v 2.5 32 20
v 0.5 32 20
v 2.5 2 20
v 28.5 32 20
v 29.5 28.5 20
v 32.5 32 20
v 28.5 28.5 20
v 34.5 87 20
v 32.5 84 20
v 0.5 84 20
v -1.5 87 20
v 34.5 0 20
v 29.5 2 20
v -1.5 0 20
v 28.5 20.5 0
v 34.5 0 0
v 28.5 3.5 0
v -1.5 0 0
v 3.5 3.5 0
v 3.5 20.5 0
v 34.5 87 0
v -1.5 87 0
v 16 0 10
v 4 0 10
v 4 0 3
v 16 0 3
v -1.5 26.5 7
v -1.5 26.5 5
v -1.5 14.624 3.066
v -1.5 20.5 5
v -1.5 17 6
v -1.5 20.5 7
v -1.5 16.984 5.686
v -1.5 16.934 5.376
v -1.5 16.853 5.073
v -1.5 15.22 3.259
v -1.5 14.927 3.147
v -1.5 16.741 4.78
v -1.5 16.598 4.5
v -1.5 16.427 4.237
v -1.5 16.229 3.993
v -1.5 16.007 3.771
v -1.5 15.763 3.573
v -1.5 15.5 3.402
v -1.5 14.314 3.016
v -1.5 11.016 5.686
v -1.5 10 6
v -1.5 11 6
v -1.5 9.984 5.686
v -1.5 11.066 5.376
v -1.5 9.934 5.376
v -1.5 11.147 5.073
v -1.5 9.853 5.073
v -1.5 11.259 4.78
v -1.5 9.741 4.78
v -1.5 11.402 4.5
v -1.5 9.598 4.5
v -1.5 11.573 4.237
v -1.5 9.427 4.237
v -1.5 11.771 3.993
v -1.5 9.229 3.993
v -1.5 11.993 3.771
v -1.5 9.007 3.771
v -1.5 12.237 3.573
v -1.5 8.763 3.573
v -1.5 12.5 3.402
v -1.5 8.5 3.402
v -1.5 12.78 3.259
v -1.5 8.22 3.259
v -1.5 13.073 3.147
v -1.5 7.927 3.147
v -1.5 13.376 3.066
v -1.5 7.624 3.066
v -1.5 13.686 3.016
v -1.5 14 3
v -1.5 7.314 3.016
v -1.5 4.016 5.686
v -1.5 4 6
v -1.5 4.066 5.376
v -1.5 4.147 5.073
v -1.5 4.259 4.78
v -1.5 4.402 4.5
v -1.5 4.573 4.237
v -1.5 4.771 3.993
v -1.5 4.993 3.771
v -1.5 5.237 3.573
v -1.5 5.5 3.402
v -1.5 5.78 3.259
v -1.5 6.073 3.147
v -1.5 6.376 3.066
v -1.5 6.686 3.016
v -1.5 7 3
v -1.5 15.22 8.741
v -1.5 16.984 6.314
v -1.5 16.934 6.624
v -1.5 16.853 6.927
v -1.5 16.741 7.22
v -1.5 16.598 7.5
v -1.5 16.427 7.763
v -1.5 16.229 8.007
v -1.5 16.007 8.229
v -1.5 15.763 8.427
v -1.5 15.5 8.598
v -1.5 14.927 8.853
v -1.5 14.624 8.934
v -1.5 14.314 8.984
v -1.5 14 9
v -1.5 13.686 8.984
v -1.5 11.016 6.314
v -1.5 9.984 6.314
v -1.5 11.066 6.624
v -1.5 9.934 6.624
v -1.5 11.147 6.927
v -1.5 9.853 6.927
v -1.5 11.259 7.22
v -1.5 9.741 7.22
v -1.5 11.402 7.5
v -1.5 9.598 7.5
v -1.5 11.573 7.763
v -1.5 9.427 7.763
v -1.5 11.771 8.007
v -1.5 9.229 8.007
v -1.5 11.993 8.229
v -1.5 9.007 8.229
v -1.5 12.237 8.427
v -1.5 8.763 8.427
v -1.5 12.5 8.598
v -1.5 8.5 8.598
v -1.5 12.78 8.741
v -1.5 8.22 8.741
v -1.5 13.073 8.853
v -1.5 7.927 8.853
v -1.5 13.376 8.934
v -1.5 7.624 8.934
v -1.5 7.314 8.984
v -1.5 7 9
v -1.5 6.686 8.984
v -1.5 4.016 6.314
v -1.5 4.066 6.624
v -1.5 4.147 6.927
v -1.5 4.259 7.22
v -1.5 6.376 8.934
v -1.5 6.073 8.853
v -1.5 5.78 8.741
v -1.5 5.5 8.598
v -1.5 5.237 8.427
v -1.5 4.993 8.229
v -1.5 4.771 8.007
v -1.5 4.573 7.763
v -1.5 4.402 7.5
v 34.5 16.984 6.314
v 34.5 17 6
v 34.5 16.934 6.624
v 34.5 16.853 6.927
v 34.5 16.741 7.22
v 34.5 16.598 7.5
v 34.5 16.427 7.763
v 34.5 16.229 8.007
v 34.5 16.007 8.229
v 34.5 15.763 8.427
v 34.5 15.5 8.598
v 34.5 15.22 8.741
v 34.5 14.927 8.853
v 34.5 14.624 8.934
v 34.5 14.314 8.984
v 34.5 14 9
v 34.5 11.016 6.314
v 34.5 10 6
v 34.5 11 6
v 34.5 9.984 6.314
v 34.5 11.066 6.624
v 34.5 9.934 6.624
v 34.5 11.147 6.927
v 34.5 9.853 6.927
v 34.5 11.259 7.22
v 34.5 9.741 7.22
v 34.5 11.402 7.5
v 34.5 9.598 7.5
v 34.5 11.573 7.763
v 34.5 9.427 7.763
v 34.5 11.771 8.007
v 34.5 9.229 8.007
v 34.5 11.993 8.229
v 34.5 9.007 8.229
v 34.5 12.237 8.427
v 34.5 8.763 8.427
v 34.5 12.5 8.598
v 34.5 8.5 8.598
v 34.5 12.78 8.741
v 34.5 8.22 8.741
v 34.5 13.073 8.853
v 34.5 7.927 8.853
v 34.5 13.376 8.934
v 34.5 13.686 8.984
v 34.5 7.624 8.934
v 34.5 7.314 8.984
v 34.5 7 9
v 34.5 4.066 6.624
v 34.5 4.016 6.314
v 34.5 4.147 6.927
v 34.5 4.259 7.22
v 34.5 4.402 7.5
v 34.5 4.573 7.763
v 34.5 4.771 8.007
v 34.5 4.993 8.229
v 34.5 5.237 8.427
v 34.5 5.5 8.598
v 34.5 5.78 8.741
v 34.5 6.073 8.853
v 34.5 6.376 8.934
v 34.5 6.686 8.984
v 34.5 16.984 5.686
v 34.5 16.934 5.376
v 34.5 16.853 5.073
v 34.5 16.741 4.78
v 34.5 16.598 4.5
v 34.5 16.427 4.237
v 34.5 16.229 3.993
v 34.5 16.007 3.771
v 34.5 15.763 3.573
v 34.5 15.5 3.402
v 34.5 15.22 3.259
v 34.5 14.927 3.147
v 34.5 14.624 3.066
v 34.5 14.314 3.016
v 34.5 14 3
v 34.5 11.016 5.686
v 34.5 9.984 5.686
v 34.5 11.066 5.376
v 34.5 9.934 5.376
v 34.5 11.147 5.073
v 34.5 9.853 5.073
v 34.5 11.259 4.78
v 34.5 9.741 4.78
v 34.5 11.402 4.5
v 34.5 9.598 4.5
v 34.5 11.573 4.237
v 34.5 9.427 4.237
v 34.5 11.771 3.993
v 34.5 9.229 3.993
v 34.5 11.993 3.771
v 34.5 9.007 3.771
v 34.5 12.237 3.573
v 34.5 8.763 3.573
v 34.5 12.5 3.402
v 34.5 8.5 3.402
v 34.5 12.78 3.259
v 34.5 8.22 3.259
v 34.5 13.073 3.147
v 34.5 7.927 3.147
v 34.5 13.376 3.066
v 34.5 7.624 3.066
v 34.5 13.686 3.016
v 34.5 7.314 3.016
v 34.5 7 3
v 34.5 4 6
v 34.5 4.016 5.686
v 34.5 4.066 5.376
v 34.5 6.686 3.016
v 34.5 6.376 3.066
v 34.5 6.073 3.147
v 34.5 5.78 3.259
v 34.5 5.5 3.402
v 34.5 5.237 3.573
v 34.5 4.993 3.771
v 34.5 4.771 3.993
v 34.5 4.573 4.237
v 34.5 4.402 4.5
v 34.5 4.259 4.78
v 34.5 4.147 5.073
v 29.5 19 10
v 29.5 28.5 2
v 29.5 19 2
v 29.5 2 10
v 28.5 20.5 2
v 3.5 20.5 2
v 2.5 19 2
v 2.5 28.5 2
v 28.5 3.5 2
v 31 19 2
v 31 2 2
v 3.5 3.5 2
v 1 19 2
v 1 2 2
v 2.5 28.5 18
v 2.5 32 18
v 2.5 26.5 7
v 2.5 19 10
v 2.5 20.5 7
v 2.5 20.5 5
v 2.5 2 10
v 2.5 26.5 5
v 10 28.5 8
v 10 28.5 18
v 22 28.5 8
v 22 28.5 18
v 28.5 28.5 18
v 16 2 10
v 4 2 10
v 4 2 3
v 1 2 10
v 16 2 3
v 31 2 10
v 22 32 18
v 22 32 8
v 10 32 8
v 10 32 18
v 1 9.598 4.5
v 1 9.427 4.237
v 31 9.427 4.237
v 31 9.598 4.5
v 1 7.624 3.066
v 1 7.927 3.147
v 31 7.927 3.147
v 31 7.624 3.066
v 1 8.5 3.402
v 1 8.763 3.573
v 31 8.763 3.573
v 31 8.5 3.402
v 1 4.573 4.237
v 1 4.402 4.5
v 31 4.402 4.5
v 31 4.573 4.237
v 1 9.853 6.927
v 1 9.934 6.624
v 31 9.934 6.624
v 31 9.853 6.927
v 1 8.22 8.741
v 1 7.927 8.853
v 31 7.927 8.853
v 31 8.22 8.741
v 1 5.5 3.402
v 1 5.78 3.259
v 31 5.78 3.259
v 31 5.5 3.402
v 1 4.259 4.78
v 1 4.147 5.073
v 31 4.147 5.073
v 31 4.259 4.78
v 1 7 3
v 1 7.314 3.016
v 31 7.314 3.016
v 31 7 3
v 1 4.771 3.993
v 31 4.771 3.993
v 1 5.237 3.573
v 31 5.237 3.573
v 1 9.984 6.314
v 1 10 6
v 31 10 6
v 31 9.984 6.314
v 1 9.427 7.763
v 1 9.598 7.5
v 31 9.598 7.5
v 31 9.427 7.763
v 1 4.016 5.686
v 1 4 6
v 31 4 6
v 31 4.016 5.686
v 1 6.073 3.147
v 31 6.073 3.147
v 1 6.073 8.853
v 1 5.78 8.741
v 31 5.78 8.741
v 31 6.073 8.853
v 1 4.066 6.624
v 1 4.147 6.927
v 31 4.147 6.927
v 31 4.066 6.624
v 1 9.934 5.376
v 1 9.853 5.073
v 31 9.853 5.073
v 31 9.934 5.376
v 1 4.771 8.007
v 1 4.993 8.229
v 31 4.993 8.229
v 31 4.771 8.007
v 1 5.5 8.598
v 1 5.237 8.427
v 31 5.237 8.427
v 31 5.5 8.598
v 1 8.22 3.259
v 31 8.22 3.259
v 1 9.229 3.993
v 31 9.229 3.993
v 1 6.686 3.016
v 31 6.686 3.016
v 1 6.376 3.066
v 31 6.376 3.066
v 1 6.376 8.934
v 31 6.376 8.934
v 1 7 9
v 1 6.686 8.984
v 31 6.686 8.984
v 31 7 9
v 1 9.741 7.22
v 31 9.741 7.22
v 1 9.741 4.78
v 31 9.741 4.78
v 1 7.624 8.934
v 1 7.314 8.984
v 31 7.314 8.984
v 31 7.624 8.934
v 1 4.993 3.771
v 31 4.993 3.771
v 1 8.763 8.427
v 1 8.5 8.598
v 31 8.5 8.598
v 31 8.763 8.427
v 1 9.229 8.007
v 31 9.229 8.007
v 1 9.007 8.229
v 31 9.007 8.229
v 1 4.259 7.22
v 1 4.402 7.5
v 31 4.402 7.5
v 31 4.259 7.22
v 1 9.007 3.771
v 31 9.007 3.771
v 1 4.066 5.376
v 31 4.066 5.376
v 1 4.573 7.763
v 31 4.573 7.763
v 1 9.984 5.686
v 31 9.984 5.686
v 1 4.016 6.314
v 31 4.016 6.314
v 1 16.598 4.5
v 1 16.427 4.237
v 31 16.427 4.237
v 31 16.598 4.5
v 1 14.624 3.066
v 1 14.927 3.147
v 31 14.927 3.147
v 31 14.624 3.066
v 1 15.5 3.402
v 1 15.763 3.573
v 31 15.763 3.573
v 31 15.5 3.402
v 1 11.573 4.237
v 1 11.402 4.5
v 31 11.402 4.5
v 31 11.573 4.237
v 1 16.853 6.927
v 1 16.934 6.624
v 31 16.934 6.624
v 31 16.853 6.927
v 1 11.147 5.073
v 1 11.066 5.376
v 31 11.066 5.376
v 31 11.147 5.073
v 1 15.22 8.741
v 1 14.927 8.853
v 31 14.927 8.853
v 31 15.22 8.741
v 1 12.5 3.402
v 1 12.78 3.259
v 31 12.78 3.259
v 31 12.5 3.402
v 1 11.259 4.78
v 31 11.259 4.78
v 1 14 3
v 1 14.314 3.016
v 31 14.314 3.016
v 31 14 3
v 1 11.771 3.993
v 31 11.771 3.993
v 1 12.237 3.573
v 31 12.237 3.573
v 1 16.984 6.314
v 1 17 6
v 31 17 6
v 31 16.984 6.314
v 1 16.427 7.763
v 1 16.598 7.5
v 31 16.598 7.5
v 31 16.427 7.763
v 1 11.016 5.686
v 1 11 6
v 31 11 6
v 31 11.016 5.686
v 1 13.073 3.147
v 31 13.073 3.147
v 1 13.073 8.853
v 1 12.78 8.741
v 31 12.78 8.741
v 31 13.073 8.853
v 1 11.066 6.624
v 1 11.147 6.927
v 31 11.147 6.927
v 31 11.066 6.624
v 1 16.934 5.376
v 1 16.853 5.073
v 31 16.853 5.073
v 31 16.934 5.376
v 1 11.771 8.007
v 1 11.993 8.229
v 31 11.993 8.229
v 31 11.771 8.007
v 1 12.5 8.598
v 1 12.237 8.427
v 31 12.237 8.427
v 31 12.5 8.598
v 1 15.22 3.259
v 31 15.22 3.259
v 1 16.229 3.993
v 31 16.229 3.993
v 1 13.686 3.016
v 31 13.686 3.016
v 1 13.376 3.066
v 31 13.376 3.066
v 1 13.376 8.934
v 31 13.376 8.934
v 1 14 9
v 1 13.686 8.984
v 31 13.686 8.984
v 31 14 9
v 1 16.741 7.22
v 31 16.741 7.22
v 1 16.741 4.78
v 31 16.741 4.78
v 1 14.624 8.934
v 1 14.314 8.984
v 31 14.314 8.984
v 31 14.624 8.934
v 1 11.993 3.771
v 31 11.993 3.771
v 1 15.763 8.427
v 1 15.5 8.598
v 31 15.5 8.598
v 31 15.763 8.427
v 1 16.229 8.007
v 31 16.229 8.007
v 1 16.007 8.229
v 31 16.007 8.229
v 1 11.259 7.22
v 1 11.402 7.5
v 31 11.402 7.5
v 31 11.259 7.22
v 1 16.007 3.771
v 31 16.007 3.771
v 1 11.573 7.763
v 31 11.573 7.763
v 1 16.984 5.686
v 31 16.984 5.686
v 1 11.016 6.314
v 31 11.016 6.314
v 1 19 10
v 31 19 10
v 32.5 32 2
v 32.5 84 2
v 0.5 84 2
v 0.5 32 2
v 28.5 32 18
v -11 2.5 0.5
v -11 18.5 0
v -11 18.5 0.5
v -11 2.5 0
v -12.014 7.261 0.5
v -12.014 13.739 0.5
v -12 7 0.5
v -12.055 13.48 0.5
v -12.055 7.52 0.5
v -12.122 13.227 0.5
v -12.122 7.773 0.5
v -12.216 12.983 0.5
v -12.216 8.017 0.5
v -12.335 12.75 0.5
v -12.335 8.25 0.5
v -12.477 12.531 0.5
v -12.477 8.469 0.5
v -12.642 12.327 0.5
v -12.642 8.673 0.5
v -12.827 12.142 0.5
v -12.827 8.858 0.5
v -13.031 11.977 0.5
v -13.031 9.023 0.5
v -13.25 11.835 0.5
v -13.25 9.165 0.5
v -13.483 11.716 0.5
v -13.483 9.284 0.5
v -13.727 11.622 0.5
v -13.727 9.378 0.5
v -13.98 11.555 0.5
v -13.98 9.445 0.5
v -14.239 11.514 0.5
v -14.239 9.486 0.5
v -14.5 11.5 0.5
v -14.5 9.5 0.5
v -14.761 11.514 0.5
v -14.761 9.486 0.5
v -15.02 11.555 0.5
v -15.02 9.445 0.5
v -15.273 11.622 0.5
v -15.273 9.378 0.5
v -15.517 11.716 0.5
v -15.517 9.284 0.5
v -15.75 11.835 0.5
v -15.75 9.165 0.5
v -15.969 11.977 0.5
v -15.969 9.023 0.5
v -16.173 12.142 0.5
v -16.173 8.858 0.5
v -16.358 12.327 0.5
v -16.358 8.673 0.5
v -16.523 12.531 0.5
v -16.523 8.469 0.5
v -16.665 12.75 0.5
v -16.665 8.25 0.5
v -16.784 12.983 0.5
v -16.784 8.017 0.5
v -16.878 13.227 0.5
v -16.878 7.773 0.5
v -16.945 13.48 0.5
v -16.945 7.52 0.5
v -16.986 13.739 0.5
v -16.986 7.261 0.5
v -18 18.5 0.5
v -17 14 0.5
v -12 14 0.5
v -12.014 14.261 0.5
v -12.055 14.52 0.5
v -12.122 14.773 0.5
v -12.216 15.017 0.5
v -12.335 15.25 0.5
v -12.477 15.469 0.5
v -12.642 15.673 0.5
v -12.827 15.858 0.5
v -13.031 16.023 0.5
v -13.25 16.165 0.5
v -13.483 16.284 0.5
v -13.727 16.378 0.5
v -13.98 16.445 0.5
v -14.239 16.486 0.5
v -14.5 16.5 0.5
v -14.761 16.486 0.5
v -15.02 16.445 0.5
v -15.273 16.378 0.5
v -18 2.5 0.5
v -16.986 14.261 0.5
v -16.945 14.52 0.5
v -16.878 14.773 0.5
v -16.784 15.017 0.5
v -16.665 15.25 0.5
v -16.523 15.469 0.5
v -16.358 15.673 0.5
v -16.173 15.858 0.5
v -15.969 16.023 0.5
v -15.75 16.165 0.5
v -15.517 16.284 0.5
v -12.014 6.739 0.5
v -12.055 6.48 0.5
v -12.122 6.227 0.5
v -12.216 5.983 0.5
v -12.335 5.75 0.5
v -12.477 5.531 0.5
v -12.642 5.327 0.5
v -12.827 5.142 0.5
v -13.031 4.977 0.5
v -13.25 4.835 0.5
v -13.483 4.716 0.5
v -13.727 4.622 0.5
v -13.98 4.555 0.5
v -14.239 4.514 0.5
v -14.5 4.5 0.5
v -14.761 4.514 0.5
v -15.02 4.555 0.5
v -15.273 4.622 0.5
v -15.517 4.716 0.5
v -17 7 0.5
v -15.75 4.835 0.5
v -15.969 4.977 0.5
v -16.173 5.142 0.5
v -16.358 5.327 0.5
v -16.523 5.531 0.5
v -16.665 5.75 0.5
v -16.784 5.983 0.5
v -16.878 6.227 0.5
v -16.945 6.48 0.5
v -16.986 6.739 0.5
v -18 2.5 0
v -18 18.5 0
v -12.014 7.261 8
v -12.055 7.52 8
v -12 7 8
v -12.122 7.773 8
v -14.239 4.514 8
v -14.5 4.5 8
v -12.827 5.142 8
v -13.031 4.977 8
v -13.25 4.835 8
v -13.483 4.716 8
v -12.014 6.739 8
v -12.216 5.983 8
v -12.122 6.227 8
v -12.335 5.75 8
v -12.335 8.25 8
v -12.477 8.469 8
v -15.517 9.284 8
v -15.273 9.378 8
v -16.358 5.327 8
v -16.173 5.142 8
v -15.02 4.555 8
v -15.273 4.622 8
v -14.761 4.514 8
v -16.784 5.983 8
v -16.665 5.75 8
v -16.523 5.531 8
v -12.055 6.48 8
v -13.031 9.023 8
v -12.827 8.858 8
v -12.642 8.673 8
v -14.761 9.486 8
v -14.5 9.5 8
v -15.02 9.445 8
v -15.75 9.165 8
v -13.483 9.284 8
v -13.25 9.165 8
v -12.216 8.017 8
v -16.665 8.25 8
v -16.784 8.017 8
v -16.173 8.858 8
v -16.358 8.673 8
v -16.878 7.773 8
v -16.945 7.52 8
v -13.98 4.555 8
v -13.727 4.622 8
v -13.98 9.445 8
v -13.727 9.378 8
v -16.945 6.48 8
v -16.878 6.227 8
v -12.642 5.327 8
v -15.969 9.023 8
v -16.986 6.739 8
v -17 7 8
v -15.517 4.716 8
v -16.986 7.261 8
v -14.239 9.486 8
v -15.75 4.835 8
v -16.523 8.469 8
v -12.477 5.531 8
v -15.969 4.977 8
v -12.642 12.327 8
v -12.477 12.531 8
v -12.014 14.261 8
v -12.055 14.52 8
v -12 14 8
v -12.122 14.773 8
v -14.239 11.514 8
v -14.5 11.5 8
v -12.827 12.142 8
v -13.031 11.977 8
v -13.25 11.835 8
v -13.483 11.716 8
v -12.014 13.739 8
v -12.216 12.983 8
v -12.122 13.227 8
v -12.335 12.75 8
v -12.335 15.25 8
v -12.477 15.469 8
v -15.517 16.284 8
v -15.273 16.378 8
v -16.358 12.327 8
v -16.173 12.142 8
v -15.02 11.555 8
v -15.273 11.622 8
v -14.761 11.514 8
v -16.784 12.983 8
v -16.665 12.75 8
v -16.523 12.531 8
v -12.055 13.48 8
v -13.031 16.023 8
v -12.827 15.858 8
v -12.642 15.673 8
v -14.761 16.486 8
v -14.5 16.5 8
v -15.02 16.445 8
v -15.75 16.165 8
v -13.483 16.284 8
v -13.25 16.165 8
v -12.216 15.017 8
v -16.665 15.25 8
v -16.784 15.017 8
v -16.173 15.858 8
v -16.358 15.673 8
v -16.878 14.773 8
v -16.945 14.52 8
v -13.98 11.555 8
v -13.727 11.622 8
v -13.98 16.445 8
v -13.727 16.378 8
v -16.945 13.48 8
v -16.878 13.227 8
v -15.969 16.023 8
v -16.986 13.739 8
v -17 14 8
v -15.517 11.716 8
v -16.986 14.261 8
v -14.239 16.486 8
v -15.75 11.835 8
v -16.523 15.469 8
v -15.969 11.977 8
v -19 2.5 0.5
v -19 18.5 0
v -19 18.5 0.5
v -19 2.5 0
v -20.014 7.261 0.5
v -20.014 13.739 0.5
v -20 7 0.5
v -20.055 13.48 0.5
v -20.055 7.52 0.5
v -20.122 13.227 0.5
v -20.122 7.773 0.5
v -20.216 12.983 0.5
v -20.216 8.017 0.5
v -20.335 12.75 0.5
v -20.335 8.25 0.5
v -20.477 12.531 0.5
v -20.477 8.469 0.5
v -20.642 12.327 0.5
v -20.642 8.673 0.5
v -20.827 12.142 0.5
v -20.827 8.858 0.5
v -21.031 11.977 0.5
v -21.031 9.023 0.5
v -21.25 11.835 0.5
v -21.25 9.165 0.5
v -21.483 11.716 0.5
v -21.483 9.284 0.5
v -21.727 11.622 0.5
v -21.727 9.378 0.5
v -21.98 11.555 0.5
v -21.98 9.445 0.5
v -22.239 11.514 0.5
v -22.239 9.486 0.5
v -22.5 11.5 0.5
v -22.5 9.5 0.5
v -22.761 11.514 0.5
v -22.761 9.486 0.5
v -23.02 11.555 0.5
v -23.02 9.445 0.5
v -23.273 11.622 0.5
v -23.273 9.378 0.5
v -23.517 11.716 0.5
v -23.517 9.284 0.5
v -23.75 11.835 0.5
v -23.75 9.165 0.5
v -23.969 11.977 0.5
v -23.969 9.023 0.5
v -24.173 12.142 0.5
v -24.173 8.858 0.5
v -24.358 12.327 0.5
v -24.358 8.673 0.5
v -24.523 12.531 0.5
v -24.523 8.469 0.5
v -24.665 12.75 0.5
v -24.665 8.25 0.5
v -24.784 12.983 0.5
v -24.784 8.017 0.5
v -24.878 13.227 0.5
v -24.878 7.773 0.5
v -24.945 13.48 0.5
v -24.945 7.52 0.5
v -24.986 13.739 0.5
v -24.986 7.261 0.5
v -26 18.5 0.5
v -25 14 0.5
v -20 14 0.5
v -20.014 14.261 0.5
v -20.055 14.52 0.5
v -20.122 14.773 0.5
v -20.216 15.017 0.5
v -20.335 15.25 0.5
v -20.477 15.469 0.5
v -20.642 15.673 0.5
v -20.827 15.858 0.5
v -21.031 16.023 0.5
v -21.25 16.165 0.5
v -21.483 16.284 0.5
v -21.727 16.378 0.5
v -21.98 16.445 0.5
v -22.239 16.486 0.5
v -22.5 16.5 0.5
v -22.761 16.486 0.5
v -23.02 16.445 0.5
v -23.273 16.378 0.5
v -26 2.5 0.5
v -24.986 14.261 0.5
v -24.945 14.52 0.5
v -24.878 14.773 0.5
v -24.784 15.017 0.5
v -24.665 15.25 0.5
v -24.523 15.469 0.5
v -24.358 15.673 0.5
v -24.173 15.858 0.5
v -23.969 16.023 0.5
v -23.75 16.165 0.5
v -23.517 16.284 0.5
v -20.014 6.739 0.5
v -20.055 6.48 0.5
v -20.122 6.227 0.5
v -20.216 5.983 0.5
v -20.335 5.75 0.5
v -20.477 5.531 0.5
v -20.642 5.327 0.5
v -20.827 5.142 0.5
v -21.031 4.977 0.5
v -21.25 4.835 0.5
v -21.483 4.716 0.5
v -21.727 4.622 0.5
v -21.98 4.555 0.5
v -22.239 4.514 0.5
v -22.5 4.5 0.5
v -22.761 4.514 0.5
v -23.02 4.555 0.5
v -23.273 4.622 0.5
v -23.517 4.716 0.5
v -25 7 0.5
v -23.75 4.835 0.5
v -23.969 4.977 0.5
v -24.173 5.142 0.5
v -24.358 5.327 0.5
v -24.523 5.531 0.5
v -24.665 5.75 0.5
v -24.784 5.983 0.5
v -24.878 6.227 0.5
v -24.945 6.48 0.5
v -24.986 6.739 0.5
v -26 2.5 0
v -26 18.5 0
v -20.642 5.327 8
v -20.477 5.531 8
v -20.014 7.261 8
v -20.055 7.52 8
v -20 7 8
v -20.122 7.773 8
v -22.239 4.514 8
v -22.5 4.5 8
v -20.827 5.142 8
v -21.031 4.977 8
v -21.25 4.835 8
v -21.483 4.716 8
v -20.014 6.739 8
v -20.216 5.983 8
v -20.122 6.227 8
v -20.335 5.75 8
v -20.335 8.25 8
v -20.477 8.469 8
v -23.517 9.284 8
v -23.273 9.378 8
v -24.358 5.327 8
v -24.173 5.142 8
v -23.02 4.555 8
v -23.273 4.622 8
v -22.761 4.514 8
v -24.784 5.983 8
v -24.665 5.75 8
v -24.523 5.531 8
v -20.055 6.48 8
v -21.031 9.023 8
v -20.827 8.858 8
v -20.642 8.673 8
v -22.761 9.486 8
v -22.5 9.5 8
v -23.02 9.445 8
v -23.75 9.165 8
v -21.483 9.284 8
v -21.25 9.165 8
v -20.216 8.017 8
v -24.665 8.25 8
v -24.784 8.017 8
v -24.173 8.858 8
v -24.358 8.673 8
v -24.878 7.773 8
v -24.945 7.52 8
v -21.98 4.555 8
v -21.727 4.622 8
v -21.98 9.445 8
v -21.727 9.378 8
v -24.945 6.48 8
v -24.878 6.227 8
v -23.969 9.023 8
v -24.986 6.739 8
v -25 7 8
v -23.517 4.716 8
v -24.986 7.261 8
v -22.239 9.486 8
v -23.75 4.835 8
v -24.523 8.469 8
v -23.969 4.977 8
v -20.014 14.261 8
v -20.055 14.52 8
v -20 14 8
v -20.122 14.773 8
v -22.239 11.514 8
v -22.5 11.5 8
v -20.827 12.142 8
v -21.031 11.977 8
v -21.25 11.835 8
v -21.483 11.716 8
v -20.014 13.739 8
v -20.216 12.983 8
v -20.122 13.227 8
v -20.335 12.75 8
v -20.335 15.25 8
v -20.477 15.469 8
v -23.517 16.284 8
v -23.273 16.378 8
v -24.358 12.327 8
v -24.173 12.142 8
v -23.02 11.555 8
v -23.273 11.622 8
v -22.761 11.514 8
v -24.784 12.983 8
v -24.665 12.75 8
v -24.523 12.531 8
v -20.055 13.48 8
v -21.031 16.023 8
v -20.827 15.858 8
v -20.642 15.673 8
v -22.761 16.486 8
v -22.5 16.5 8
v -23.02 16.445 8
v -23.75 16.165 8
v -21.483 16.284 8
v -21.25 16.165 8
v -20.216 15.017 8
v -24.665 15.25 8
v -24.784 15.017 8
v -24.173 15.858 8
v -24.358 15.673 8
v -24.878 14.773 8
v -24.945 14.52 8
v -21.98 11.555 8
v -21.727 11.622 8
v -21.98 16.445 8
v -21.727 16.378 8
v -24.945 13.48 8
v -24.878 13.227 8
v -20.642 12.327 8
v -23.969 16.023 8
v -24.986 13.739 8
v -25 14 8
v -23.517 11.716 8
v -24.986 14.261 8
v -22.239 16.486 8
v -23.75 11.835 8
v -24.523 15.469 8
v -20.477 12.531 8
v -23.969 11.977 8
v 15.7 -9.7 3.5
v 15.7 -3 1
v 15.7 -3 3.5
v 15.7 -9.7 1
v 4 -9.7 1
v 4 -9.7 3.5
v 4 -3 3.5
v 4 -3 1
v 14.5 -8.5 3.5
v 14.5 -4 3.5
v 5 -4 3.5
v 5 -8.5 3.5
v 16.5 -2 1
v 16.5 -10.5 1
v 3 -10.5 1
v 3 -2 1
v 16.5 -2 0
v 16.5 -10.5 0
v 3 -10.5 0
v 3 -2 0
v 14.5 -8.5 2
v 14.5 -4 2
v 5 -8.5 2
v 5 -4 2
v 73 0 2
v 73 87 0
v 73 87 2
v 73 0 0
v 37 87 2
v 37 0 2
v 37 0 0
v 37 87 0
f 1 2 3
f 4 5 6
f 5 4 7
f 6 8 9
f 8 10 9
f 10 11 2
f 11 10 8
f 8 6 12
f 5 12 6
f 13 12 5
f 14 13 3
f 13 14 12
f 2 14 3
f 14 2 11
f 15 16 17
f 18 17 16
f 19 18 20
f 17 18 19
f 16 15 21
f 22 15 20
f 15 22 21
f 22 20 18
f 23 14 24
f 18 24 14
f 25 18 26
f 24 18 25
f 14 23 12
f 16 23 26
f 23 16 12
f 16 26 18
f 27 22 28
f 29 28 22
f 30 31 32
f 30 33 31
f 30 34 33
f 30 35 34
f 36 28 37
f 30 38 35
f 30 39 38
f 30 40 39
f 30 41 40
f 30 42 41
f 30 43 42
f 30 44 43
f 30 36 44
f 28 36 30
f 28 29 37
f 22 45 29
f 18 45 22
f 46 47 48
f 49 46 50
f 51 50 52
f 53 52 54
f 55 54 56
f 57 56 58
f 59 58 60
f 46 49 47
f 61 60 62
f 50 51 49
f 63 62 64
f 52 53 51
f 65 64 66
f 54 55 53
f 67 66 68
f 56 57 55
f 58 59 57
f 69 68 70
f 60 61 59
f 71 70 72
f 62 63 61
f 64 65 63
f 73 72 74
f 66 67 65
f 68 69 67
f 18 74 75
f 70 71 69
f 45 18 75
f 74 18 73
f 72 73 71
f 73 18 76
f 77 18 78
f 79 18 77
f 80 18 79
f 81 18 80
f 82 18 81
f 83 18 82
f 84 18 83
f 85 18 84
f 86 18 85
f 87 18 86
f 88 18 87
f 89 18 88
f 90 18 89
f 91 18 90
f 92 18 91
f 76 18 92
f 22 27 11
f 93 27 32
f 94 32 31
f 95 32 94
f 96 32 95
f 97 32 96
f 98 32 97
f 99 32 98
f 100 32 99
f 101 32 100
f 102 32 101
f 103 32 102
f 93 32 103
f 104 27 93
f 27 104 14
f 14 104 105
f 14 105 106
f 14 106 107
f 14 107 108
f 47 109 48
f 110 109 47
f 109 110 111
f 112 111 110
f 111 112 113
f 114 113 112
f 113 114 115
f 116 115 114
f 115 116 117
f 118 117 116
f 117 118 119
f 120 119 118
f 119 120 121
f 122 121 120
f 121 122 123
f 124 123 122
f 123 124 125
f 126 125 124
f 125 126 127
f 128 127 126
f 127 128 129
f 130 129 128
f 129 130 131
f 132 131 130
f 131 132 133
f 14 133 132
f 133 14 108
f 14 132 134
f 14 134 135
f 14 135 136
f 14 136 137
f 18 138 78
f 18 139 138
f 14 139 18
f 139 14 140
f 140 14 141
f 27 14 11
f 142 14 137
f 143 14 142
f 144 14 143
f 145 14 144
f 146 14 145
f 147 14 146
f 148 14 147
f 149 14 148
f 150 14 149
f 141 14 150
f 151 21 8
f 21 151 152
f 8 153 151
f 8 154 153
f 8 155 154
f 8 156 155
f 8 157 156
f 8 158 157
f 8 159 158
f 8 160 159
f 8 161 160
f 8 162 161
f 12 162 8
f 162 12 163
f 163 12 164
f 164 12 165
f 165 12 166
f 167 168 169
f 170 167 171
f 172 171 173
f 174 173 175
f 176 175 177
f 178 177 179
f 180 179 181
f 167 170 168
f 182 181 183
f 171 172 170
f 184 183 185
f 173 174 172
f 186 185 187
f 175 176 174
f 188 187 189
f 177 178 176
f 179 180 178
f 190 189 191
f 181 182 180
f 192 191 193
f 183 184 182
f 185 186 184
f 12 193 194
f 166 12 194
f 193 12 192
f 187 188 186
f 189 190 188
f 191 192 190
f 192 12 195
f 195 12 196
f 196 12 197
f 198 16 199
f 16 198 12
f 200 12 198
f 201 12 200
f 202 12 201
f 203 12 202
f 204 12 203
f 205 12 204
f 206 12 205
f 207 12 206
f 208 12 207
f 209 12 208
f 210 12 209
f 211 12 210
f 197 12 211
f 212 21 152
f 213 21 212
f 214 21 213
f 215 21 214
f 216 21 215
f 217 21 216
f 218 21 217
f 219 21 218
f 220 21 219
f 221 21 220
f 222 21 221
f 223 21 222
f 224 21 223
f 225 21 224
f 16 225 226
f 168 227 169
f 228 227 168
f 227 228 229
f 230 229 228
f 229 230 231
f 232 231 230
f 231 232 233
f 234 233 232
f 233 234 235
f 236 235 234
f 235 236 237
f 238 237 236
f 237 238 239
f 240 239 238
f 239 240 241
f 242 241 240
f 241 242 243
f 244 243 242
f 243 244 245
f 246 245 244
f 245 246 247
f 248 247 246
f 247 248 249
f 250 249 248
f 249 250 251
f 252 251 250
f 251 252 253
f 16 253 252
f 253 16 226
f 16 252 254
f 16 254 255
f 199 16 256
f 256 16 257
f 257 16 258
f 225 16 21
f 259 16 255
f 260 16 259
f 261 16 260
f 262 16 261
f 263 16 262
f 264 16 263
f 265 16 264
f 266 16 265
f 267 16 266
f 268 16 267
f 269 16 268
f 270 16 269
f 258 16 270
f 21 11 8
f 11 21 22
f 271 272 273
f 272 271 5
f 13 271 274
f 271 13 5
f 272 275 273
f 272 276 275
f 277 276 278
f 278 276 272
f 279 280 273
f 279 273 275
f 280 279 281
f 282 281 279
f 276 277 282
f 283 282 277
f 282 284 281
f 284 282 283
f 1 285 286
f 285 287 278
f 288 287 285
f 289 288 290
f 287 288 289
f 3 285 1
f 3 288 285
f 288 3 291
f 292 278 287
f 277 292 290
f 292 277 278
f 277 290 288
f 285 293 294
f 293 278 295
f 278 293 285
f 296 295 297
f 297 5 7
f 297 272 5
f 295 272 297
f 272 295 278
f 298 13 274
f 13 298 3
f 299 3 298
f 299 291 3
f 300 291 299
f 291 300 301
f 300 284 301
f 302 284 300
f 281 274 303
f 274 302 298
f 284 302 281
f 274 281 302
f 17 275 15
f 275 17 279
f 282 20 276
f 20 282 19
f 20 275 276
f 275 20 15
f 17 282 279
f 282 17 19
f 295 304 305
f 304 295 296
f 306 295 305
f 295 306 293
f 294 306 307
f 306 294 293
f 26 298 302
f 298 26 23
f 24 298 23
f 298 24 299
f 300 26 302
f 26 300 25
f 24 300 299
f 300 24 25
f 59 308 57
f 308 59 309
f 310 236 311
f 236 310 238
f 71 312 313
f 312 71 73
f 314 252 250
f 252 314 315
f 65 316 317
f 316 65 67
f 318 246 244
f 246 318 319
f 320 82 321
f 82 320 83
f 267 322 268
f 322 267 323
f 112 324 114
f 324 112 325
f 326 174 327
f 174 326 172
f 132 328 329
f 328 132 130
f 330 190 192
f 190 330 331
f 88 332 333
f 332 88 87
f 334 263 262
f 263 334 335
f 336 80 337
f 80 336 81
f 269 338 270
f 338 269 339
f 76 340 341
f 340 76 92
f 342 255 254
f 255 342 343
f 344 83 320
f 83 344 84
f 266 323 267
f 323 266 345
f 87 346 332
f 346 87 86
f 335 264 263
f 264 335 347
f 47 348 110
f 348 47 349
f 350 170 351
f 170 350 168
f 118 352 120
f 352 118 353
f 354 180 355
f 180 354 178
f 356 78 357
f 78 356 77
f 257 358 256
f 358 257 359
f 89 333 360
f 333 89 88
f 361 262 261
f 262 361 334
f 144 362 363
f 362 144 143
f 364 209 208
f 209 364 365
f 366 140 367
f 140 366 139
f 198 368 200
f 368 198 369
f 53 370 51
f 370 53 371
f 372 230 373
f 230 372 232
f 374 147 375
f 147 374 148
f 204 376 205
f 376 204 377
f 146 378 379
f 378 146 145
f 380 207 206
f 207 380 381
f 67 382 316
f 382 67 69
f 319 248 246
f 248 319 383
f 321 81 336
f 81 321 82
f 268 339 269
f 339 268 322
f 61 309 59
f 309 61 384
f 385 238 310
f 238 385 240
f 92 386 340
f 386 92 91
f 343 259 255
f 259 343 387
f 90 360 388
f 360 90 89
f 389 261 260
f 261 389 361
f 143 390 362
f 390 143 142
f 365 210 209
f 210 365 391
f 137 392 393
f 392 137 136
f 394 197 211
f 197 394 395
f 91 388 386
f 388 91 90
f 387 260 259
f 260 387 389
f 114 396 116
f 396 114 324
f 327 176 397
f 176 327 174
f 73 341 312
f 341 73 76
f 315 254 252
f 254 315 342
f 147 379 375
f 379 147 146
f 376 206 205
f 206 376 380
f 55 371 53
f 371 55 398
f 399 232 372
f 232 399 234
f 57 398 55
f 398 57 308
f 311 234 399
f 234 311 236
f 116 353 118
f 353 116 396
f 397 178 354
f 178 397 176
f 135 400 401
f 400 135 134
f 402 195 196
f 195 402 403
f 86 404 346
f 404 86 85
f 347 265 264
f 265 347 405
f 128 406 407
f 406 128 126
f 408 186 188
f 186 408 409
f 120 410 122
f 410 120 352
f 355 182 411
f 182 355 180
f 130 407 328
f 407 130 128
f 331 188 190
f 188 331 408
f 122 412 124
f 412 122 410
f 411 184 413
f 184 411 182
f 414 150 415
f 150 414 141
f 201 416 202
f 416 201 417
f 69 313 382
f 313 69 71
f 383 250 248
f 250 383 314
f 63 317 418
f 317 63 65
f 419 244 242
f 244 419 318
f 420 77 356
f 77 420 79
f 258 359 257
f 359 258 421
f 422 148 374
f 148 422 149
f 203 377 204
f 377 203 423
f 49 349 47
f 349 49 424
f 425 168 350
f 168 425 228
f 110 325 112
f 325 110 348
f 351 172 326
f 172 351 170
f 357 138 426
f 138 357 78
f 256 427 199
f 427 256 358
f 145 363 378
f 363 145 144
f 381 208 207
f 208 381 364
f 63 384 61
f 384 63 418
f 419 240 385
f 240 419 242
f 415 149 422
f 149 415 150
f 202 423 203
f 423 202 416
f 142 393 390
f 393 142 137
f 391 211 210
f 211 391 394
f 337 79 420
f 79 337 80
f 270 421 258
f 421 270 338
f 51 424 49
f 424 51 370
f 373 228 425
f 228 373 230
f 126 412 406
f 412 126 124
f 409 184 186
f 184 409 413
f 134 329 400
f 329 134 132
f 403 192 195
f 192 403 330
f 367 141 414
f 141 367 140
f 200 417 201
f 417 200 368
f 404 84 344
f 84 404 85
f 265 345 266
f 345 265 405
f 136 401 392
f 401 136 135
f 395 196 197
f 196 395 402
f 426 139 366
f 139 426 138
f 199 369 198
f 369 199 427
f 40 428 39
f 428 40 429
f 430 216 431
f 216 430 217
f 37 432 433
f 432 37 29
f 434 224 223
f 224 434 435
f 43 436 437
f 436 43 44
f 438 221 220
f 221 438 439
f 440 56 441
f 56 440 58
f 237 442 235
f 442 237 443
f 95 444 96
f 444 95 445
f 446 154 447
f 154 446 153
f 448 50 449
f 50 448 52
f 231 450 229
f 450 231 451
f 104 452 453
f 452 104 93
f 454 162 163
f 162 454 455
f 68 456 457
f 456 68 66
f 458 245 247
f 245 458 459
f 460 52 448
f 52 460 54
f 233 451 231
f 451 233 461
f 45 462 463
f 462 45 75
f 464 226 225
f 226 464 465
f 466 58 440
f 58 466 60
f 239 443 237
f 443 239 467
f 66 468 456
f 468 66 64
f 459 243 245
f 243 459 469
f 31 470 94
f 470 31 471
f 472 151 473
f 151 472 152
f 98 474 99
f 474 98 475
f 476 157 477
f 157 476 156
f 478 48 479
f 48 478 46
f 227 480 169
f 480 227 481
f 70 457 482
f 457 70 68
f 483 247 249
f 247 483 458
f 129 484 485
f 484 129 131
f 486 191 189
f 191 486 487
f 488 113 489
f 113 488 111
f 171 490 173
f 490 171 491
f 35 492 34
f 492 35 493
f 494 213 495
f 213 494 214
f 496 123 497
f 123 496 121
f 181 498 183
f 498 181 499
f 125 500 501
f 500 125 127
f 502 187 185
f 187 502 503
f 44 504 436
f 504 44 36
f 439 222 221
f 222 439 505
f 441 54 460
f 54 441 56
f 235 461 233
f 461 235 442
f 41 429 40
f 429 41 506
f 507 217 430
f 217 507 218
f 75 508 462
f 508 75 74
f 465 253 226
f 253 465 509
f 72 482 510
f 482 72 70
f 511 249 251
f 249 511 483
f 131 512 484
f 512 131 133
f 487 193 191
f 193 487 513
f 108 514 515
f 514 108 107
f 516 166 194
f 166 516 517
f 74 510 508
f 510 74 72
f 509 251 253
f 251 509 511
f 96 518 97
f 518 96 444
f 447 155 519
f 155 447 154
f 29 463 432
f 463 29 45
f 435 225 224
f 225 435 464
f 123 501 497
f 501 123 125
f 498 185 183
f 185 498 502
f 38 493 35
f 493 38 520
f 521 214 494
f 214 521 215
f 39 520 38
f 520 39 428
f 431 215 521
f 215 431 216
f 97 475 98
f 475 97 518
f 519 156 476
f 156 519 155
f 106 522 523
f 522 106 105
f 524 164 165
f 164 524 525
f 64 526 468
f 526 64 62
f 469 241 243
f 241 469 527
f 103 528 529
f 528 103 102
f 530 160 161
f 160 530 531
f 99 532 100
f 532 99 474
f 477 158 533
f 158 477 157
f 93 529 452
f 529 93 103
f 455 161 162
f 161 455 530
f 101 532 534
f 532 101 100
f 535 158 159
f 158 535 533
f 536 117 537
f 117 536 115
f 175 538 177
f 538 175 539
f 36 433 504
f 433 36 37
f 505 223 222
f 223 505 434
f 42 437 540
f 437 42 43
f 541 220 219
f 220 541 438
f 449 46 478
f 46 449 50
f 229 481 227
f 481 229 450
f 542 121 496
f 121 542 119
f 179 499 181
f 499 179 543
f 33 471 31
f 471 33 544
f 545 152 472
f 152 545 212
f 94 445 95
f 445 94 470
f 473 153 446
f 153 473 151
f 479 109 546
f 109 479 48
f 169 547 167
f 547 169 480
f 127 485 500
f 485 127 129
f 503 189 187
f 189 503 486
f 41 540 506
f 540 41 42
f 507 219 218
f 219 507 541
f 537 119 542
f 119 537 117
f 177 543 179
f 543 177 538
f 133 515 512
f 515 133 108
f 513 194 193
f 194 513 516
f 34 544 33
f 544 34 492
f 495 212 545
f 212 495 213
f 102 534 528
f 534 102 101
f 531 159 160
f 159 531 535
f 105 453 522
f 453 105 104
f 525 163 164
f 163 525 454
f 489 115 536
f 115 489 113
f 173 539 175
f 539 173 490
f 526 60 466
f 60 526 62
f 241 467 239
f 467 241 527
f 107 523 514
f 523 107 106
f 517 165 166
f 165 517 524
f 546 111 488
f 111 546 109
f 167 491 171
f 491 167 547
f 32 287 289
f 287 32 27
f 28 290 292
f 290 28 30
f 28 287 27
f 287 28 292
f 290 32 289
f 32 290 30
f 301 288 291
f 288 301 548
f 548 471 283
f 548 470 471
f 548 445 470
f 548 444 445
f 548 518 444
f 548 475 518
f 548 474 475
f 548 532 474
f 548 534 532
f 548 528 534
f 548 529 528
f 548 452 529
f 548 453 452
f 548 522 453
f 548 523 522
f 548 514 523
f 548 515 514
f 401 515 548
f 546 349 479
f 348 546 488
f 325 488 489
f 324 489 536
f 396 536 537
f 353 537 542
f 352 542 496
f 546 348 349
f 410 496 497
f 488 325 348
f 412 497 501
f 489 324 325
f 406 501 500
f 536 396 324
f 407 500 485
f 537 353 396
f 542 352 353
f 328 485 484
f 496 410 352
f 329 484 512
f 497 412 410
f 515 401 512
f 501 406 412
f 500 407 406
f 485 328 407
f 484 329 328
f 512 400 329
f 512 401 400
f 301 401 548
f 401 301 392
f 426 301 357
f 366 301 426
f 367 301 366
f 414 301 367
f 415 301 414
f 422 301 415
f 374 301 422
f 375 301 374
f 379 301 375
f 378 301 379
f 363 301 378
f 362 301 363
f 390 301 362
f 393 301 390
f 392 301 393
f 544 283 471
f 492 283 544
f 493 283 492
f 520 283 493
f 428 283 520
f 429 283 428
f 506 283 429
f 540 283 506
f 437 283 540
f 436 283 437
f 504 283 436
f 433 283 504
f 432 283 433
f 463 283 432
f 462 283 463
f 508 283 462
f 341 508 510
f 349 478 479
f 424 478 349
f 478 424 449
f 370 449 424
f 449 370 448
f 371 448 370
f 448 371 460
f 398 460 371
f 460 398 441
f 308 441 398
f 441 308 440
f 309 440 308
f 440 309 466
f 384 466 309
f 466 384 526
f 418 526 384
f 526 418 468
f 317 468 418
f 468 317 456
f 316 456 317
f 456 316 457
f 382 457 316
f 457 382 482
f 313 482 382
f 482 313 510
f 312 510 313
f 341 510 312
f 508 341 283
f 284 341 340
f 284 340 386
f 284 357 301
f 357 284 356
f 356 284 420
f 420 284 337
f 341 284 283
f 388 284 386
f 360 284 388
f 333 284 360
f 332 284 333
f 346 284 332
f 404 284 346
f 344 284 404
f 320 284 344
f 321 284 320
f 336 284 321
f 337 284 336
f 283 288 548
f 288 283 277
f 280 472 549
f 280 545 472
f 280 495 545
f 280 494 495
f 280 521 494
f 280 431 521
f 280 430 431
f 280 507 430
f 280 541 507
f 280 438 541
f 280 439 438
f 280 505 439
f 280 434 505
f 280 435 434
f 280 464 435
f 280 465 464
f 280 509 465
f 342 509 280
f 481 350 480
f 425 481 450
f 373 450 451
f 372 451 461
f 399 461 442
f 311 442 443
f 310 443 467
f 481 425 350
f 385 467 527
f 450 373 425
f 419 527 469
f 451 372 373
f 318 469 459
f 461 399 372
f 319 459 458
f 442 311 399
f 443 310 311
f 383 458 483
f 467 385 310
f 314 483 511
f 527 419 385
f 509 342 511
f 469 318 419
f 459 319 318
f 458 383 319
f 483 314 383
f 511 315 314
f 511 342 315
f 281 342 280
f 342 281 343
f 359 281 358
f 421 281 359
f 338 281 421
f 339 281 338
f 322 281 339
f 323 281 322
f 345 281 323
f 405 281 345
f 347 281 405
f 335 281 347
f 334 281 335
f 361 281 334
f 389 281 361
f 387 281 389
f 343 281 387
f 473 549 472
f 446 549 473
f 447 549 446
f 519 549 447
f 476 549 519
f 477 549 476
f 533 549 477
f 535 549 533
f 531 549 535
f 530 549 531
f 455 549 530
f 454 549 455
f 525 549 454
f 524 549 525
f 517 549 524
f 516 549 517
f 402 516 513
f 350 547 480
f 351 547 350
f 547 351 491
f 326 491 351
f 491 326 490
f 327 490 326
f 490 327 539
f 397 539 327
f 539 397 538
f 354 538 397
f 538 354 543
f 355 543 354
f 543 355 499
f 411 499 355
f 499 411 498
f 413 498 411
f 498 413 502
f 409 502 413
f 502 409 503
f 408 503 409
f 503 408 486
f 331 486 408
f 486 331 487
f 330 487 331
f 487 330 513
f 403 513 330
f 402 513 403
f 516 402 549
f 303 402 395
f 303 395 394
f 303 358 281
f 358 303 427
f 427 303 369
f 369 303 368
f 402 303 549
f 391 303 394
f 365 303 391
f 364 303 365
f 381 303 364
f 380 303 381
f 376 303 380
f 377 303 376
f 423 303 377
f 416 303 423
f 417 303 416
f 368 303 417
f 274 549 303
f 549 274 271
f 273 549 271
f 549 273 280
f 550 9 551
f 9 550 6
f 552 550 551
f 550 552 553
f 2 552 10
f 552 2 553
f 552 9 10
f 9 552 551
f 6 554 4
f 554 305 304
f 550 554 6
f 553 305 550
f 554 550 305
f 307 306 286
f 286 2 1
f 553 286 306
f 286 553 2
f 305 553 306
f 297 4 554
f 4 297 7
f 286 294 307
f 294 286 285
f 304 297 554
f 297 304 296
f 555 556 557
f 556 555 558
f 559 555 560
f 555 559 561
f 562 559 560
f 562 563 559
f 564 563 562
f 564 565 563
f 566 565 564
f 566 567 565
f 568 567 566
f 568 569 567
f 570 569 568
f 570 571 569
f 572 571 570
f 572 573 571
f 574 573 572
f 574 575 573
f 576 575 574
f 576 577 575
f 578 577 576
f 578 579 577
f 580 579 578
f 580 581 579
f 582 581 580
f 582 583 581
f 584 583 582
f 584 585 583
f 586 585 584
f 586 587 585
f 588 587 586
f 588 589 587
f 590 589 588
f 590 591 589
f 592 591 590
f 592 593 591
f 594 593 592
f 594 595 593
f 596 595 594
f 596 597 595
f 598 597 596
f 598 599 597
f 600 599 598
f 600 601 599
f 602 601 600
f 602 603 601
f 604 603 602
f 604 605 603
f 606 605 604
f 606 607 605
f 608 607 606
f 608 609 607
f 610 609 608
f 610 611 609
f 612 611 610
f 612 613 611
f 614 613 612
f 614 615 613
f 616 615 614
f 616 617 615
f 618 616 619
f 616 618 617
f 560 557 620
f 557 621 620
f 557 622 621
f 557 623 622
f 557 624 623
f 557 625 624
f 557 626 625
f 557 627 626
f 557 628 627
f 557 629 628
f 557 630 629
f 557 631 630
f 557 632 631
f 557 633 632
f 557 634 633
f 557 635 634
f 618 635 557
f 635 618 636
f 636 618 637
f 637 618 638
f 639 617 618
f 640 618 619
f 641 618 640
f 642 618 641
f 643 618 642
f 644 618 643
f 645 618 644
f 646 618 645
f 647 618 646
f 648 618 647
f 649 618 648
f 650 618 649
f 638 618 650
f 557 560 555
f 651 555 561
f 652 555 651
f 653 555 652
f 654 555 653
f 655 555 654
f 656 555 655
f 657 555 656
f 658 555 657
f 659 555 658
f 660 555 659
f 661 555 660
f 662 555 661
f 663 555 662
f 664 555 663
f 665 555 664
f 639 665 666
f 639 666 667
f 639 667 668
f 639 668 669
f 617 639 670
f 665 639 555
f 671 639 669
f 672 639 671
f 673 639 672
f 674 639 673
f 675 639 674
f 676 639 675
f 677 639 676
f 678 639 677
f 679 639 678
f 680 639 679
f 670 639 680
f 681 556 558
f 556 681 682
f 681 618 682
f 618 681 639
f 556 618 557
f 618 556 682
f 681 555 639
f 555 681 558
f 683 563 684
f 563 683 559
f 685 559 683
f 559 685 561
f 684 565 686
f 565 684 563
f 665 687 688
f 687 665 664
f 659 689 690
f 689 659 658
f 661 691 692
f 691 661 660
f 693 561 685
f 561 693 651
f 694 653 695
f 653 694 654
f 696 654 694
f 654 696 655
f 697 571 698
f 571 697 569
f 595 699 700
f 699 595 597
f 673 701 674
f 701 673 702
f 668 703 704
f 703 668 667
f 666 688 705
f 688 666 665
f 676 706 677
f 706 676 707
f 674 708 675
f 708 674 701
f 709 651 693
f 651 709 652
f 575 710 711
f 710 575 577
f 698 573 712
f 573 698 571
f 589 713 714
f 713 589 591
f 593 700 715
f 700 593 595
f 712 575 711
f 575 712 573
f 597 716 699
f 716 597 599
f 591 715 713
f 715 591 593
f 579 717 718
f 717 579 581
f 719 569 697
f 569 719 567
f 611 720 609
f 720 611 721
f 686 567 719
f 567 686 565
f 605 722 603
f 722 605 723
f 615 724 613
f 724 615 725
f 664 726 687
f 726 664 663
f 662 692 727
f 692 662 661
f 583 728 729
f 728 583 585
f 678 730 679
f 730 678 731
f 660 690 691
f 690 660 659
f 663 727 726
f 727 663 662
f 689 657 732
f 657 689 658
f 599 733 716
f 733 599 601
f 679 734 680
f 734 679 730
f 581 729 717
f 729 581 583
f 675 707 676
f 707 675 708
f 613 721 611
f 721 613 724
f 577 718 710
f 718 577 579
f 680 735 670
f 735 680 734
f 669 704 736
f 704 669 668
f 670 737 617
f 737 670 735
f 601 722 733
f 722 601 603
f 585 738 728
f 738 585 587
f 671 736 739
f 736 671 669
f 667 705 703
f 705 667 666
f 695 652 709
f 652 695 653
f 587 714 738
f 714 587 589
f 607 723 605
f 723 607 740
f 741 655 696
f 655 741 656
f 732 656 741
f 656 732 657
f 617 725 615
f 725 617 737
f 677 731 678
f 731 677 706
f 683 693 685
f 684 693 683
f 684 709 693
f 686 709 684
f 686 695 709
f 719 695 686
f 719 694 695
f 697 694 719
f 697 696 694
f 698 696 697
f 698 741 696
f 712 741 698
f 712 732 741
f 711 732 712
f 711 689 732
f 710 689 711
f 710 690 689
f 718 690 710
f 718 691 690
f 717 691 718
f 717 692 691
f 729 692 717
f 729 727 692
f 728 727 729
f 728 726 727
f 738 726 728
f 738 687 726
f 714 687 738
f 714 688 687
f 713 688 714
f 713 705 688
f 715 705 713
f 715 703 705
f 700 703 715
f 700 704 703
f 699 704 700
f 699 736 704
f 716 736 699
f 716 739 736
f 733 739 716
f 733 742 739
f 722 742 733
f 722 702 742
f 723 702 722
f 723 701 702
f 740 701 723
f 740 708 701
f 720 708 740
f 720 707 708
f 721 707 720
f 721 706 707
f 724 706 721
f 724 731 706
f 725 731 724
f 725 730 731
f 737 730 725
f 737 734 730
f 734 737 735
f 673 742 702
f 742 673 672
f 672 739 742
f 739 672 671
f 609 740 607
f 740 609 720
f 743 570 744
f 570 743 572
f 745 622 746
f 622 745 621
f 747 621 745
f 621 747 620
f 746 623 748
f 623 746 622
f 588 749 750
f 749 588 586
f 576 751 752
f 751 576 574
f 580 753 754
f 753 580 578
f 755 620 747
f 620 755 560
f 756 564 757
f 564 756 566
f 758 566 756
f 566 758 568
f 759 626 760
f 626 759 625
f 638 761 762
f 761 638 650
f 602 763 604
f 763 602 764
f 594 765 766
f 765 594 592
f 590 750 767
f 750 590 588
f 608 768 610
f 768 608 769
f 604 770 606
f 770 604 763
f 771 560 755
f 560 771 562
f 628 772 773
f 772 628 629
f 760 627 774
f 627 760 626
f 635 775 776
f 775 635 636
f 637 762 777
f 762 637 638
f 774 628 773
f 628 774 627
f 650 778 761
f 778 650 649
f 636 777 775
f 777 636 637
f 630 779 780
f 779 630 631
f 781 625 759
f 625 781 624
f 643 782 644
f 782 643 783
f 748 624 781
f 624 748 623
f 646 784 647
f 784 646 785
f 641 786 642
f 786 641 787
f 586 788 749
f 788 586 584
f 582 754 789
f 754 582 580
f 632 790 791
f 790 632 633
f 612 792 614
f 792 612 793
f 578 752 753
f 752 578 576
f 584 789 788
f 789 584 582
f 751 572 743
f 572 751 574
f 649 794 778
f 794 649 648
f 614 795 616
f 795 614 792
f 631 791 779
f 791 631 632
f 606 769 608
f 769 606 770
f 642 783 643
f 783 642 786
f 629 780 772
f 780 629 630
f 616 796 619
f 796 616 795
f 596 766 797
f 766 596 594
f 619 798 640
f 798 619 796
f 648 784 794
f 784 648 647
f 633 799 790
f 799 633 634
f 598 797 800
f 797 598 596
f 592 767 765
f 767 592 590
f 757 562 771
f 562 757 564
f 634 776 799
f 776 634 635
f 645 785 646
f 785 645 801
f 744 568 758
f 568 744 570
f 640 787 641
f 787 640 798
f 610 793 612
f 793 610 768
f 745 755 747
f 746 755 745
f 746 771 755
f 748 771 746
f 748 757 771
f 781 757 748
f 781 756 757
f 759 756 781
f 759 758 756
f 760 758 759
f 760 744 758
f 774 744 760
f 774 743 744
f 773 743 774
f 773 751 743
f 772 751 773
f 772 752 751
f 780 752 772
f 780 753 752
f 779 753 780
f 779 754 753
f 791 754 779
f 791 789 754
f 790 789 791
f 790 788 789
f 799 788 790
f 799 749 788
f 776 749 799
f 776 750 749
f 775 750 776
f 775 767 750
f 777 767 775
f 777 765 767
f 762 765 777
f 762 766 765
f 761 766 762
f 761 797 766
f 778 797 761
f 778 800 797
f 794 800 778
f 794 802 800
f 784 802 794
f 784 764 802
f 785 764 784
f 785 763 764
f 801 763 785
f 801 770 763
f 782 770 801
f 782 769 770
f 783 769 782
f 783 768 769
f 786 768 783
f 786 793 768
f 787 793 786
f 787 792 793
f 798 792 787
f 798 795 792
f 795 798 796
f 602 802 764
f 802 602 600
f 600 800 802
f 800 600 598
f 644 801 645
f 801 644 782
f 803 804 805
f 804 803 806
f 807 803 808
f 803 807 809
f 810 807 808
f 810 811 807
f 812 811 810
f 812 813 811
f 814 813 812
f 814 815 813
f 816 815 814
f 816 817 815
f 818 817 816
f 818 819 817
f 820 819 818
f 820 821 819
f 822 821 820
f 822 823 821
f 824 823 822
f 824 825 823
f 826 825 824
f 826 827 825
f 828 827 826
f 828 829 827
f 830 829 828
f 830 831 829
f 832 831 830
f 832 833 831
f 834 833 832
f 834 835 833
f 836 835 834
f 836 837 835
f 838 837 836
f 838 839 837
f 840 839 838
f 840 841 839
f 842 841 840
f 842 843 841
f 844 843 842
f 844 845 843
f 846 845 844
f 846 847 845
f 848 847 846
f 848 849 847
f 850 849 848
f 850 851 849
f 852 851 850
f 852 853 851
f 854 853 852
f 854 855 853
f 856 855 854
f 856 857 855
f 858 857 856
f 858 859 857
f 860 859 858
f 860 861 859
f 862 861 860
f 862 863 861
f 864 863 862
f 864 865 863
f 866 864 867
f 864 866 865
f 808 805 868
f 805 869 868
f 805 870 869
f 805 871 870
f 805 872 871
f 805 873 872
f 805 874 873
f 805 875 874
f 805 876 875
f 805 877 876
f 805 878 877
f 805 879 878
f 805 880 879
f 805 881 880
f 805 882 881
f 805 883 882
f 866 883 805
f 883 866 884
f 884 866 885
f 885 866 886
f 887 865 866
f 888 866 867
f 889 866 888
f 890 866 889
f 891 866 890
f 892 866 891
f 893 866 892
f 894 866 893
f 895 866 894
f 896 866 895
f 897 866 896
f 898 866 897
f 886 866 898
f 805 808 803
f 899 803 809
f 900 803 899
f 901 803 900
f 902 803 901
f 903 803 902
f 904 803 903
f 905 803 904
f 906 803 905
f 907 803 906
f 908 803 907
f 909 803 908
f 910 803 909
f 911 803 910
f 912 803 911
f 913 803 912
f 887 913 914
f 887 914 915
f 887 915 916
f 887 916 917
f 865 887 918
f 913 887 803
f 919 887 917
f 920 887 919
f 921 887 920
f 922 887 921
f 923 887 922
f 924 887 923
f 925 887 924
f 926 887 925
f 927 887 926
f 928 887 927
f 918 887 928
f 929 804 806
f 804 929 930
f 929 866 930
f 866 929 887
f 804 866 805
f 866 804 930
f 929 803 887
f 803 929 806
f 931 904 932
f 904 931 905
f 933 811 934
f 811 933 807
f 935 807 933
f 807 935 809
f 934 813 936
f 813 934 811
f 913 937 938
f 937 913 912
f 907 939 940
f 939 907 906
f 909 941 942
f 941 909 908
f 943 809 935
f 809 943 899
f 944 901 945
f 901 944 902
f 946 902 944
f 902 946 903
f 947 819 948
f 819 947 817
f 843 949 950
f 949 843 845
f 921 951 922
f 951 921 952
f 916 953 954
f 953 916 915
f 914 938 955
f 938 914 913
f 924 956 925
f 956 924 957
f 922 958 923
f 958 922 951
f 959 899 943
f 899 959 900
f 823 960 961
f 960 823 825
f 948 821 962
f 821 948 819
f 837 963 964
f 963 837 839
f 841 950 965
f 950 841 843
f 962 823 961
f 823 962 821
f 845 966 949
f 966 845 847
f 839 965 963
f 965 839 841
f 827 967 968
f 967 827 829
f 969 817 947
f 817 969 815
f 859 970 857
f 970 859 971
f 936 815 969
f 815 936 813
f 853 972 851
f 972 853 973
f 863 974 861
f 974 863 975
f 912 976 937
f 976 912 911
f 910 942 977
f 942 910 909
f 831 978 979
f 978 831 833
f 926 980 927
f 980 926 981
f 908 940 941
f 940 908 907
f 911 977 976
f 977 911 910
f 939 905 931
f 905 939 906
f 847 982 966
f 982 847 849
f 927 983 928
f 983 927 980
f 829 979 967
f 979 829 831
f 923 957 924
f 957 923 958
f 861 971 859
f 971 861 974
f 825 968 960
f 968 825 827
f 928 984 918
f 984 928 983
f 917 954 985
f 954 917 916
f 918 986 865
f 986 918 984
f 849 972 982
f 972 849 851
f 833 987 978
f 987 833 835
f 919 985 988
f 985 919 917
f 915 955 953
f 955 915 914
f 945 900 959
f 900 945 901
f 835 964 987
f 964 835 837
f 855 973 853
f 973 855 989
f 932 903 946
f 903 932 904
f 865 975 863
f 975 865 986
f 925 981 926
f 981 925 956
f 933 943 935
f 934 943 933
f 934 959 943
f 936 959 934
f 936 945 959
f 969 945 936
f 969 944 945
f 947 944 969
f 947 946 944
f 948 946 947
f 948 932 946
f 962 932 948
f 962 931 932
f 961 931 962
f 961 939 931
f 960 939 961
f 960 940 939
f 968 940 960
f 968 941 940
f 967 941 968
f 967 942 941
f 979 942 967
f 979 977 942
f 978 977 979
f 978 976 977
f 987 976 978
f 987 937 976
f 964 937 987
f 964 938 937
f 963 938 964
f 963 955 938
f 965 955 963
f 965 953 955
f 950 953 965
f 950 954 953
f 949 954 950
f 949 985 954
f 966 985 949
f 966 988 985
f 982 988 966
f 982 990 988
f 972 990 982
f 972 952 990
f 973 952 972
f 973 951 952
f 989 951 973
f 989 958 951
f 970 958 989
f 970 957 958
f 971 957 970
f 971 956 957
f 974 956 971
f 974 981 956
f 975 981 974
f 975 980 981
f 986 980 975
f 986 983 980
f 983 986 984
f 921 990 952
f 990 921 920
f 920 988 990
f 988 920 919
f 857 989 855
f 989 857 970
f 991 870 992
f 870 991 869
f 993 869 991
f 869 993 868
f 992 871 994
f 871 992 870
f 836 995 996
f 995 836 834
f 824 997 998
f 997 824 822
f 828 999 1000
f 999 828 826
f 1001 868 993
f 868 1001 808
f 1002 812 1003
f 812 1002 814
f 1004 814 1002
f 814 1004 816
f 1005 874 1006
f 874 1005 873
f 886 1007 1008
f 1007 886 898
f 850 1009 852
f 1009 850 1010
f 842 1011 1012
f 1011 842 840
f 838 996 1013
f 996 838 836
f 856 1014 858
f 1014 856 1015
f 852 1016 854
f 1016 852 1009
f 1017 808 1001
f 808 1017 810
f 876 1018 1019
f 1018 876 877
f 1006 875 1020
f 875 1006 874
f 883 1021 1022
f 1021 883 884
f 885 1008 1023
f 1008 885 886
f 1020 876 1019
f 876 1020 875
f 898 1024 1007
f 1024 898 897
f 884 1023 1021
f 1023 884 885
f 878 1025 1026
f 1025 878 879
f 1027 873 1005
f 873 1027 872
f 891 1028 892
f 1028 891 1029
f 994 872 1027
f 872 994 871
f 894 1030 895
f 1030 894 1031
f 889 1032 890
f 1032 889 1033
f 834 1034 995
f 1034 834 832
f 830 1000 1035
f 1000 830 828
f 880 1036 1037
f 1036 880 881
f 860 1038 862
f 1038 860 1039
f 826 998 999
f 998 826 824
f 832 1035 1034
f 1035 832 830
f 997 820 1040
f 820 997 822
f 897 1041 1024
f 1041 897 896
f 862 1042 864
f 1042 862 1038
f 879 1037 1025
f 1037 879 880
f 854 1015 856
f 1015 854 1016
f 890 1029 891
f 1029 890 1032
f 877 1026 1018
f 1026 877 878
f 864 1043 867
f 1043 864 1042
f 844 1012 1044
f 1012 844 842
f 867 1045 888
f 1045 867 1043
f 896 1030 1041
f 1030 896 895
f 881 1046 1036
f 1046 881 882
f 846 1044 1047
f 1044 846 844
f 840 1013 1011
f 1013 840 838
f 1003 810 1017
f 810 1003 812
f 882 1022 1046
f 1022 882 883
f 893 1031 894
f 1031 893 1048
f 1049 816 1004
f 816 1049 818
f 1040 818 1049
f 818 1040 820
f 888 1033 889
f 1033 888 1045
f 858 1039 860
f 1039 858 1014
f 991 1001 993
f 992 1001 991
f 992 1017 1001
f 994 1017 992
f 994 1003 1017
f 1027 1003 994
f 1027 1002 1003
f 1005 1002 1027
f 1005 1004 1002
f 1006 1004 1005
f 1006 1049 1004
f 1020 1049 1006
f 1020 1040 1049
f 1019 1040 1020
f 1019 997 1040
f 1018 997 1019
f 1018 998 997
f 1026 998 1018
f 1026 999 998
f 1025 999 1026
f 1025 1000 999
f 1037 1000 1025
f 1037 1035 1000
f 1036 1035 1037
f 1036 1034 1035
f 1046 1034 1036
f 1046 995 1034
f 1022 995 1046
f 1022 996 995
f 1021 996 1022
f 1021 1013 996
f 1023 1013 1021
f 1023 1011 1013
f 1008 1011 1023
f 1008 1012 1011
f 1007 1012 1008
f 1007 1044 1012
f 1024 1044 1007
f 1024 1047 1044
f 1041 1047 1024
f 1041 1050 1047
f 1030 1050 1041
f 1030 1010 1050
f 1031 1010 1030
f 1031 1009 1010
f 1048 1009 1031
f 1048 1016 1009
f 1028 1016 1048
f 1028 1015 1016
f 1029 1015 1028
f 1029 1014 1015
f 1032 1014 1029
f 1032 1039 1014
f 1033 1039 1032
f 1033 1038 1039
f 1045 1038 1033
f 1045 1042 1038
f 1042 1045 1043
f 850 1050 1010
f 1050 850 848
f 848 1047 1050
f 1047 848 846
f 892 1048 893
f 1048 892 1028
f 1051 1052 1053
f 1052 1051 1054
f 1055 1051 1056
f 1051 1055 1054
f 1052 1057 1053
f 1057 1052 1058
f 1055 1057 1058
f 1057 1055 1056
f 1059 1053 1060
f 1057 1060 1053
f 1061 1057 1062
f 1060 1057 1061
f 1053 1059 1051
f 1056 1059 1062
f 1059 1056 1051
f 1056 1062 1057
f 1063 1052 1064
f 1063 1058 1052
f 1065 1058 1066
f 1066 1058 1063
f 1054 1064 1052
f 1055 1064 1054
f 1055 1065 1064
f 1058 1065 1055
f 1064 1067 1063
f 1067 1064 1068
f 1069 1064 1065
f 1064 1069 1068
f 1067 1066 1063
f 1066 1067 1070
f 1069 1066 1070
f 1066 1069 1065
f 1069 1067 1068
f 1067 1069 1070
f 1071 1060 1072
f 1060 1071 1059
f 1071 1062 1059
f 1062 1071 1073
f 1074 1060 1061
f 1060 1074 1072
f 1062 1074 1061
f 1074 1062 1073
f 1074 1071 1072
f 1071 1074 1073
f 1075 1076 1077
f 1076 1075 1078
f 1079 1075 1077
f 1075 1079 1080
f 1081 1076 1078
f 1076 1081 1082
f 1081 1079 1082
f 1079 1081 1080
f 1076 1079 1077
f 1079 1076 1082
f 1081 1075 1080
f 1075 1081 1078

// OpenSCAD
box = 1;
lid = 1;
usbstopper = 1;
buttons1 = 1;
buttons2 = 1;

if(box==1)
{
//main box
difference()
{
//main shell   
union(){    
cube([32,30.5,20],center=false);
translate([-1.5,0,0])cube([3.5,30.5,20],center=false);
translate([31,0,0])cube([3.5,30.5,20],center=false);
translate([-1.5,30,0])cube([36,57,20],center=false);

}

//internal space
translate([2.5,2,2])cube([27,26.5,24],center=false);
//window for screen
translate([3.5,3.5,0])cube([25,17,26],center=false);
// SD card slot
translate([10,24,8])cube([12,12,13],center=false);
// USB slot
translate([4,-3,3])cube([12,8,7],center=false);
//buttonhole(lower)
translate([-2,7,6])rotate([0,90,0]) cylinder(h=40,r=3,$fn=60);
//buttonhole(upper)
translate([-2,14,6])rotate([0,90,0]) cylinder(h=40,r=3,$fn=60);
//switch access
translate([-2,20.5,5])cube([8,6,2],center=false);
//buttoninners
translate([1,2,2])cube([2,17,8],center=false);
translate([29,2,2])cube([2,17,8],center=false);
//sdcard extra space
//translate([8,26,2])cube([16,3,25],center=false);
//somewhere for battery
translate([0.5,32,2])cube([32,52,20],center=false);

//leave somewhere for wires
translate([2.5,22,18])cube([26,20,20],center=false);
}
}


if(buttons1==1)
{
//buttons1
//rotate([0,90,180])translate([-1.5,-21,-2])color("blue")
{
translate([-18,2.5,0])cube([7,16,0.5],center=false);
translate([-14.5,7,0])cylinder(h=8,r=2.5,$fn=60);
translate([-14.5,14,0])cylinder(h=8,r=2.5,$fn=60);
}
}

if(buttons2==1)
{    
//buttons2
translate([-8,0,0])
{
translate([-18,2.5,0])cube([7,16,0.5],center=false);
translate([-14.5,7,0])cylinder(h=8,r=2.5,$fn=60);
translate([-14.5,14,0])cylinder(h=8,r=2.5,$fn=60);
}
}


if(lid==1)
{
//lid
translate([37,0,0])cube([36,87,2],center=false);

}

if (usbstopper==1)
{
// USB plug
translate([0,0,9])rotate([90,0,0])
{
difference()
{
union(){
translate([4,-8,3])cube([11.7,2.5,6.7],center=false);
translate([3,-9,2])cube([13.5,1,8.5],center=false);
}
translate([5,-7,4])cube([9.5,5,4.5],center=false);
}
}
}
